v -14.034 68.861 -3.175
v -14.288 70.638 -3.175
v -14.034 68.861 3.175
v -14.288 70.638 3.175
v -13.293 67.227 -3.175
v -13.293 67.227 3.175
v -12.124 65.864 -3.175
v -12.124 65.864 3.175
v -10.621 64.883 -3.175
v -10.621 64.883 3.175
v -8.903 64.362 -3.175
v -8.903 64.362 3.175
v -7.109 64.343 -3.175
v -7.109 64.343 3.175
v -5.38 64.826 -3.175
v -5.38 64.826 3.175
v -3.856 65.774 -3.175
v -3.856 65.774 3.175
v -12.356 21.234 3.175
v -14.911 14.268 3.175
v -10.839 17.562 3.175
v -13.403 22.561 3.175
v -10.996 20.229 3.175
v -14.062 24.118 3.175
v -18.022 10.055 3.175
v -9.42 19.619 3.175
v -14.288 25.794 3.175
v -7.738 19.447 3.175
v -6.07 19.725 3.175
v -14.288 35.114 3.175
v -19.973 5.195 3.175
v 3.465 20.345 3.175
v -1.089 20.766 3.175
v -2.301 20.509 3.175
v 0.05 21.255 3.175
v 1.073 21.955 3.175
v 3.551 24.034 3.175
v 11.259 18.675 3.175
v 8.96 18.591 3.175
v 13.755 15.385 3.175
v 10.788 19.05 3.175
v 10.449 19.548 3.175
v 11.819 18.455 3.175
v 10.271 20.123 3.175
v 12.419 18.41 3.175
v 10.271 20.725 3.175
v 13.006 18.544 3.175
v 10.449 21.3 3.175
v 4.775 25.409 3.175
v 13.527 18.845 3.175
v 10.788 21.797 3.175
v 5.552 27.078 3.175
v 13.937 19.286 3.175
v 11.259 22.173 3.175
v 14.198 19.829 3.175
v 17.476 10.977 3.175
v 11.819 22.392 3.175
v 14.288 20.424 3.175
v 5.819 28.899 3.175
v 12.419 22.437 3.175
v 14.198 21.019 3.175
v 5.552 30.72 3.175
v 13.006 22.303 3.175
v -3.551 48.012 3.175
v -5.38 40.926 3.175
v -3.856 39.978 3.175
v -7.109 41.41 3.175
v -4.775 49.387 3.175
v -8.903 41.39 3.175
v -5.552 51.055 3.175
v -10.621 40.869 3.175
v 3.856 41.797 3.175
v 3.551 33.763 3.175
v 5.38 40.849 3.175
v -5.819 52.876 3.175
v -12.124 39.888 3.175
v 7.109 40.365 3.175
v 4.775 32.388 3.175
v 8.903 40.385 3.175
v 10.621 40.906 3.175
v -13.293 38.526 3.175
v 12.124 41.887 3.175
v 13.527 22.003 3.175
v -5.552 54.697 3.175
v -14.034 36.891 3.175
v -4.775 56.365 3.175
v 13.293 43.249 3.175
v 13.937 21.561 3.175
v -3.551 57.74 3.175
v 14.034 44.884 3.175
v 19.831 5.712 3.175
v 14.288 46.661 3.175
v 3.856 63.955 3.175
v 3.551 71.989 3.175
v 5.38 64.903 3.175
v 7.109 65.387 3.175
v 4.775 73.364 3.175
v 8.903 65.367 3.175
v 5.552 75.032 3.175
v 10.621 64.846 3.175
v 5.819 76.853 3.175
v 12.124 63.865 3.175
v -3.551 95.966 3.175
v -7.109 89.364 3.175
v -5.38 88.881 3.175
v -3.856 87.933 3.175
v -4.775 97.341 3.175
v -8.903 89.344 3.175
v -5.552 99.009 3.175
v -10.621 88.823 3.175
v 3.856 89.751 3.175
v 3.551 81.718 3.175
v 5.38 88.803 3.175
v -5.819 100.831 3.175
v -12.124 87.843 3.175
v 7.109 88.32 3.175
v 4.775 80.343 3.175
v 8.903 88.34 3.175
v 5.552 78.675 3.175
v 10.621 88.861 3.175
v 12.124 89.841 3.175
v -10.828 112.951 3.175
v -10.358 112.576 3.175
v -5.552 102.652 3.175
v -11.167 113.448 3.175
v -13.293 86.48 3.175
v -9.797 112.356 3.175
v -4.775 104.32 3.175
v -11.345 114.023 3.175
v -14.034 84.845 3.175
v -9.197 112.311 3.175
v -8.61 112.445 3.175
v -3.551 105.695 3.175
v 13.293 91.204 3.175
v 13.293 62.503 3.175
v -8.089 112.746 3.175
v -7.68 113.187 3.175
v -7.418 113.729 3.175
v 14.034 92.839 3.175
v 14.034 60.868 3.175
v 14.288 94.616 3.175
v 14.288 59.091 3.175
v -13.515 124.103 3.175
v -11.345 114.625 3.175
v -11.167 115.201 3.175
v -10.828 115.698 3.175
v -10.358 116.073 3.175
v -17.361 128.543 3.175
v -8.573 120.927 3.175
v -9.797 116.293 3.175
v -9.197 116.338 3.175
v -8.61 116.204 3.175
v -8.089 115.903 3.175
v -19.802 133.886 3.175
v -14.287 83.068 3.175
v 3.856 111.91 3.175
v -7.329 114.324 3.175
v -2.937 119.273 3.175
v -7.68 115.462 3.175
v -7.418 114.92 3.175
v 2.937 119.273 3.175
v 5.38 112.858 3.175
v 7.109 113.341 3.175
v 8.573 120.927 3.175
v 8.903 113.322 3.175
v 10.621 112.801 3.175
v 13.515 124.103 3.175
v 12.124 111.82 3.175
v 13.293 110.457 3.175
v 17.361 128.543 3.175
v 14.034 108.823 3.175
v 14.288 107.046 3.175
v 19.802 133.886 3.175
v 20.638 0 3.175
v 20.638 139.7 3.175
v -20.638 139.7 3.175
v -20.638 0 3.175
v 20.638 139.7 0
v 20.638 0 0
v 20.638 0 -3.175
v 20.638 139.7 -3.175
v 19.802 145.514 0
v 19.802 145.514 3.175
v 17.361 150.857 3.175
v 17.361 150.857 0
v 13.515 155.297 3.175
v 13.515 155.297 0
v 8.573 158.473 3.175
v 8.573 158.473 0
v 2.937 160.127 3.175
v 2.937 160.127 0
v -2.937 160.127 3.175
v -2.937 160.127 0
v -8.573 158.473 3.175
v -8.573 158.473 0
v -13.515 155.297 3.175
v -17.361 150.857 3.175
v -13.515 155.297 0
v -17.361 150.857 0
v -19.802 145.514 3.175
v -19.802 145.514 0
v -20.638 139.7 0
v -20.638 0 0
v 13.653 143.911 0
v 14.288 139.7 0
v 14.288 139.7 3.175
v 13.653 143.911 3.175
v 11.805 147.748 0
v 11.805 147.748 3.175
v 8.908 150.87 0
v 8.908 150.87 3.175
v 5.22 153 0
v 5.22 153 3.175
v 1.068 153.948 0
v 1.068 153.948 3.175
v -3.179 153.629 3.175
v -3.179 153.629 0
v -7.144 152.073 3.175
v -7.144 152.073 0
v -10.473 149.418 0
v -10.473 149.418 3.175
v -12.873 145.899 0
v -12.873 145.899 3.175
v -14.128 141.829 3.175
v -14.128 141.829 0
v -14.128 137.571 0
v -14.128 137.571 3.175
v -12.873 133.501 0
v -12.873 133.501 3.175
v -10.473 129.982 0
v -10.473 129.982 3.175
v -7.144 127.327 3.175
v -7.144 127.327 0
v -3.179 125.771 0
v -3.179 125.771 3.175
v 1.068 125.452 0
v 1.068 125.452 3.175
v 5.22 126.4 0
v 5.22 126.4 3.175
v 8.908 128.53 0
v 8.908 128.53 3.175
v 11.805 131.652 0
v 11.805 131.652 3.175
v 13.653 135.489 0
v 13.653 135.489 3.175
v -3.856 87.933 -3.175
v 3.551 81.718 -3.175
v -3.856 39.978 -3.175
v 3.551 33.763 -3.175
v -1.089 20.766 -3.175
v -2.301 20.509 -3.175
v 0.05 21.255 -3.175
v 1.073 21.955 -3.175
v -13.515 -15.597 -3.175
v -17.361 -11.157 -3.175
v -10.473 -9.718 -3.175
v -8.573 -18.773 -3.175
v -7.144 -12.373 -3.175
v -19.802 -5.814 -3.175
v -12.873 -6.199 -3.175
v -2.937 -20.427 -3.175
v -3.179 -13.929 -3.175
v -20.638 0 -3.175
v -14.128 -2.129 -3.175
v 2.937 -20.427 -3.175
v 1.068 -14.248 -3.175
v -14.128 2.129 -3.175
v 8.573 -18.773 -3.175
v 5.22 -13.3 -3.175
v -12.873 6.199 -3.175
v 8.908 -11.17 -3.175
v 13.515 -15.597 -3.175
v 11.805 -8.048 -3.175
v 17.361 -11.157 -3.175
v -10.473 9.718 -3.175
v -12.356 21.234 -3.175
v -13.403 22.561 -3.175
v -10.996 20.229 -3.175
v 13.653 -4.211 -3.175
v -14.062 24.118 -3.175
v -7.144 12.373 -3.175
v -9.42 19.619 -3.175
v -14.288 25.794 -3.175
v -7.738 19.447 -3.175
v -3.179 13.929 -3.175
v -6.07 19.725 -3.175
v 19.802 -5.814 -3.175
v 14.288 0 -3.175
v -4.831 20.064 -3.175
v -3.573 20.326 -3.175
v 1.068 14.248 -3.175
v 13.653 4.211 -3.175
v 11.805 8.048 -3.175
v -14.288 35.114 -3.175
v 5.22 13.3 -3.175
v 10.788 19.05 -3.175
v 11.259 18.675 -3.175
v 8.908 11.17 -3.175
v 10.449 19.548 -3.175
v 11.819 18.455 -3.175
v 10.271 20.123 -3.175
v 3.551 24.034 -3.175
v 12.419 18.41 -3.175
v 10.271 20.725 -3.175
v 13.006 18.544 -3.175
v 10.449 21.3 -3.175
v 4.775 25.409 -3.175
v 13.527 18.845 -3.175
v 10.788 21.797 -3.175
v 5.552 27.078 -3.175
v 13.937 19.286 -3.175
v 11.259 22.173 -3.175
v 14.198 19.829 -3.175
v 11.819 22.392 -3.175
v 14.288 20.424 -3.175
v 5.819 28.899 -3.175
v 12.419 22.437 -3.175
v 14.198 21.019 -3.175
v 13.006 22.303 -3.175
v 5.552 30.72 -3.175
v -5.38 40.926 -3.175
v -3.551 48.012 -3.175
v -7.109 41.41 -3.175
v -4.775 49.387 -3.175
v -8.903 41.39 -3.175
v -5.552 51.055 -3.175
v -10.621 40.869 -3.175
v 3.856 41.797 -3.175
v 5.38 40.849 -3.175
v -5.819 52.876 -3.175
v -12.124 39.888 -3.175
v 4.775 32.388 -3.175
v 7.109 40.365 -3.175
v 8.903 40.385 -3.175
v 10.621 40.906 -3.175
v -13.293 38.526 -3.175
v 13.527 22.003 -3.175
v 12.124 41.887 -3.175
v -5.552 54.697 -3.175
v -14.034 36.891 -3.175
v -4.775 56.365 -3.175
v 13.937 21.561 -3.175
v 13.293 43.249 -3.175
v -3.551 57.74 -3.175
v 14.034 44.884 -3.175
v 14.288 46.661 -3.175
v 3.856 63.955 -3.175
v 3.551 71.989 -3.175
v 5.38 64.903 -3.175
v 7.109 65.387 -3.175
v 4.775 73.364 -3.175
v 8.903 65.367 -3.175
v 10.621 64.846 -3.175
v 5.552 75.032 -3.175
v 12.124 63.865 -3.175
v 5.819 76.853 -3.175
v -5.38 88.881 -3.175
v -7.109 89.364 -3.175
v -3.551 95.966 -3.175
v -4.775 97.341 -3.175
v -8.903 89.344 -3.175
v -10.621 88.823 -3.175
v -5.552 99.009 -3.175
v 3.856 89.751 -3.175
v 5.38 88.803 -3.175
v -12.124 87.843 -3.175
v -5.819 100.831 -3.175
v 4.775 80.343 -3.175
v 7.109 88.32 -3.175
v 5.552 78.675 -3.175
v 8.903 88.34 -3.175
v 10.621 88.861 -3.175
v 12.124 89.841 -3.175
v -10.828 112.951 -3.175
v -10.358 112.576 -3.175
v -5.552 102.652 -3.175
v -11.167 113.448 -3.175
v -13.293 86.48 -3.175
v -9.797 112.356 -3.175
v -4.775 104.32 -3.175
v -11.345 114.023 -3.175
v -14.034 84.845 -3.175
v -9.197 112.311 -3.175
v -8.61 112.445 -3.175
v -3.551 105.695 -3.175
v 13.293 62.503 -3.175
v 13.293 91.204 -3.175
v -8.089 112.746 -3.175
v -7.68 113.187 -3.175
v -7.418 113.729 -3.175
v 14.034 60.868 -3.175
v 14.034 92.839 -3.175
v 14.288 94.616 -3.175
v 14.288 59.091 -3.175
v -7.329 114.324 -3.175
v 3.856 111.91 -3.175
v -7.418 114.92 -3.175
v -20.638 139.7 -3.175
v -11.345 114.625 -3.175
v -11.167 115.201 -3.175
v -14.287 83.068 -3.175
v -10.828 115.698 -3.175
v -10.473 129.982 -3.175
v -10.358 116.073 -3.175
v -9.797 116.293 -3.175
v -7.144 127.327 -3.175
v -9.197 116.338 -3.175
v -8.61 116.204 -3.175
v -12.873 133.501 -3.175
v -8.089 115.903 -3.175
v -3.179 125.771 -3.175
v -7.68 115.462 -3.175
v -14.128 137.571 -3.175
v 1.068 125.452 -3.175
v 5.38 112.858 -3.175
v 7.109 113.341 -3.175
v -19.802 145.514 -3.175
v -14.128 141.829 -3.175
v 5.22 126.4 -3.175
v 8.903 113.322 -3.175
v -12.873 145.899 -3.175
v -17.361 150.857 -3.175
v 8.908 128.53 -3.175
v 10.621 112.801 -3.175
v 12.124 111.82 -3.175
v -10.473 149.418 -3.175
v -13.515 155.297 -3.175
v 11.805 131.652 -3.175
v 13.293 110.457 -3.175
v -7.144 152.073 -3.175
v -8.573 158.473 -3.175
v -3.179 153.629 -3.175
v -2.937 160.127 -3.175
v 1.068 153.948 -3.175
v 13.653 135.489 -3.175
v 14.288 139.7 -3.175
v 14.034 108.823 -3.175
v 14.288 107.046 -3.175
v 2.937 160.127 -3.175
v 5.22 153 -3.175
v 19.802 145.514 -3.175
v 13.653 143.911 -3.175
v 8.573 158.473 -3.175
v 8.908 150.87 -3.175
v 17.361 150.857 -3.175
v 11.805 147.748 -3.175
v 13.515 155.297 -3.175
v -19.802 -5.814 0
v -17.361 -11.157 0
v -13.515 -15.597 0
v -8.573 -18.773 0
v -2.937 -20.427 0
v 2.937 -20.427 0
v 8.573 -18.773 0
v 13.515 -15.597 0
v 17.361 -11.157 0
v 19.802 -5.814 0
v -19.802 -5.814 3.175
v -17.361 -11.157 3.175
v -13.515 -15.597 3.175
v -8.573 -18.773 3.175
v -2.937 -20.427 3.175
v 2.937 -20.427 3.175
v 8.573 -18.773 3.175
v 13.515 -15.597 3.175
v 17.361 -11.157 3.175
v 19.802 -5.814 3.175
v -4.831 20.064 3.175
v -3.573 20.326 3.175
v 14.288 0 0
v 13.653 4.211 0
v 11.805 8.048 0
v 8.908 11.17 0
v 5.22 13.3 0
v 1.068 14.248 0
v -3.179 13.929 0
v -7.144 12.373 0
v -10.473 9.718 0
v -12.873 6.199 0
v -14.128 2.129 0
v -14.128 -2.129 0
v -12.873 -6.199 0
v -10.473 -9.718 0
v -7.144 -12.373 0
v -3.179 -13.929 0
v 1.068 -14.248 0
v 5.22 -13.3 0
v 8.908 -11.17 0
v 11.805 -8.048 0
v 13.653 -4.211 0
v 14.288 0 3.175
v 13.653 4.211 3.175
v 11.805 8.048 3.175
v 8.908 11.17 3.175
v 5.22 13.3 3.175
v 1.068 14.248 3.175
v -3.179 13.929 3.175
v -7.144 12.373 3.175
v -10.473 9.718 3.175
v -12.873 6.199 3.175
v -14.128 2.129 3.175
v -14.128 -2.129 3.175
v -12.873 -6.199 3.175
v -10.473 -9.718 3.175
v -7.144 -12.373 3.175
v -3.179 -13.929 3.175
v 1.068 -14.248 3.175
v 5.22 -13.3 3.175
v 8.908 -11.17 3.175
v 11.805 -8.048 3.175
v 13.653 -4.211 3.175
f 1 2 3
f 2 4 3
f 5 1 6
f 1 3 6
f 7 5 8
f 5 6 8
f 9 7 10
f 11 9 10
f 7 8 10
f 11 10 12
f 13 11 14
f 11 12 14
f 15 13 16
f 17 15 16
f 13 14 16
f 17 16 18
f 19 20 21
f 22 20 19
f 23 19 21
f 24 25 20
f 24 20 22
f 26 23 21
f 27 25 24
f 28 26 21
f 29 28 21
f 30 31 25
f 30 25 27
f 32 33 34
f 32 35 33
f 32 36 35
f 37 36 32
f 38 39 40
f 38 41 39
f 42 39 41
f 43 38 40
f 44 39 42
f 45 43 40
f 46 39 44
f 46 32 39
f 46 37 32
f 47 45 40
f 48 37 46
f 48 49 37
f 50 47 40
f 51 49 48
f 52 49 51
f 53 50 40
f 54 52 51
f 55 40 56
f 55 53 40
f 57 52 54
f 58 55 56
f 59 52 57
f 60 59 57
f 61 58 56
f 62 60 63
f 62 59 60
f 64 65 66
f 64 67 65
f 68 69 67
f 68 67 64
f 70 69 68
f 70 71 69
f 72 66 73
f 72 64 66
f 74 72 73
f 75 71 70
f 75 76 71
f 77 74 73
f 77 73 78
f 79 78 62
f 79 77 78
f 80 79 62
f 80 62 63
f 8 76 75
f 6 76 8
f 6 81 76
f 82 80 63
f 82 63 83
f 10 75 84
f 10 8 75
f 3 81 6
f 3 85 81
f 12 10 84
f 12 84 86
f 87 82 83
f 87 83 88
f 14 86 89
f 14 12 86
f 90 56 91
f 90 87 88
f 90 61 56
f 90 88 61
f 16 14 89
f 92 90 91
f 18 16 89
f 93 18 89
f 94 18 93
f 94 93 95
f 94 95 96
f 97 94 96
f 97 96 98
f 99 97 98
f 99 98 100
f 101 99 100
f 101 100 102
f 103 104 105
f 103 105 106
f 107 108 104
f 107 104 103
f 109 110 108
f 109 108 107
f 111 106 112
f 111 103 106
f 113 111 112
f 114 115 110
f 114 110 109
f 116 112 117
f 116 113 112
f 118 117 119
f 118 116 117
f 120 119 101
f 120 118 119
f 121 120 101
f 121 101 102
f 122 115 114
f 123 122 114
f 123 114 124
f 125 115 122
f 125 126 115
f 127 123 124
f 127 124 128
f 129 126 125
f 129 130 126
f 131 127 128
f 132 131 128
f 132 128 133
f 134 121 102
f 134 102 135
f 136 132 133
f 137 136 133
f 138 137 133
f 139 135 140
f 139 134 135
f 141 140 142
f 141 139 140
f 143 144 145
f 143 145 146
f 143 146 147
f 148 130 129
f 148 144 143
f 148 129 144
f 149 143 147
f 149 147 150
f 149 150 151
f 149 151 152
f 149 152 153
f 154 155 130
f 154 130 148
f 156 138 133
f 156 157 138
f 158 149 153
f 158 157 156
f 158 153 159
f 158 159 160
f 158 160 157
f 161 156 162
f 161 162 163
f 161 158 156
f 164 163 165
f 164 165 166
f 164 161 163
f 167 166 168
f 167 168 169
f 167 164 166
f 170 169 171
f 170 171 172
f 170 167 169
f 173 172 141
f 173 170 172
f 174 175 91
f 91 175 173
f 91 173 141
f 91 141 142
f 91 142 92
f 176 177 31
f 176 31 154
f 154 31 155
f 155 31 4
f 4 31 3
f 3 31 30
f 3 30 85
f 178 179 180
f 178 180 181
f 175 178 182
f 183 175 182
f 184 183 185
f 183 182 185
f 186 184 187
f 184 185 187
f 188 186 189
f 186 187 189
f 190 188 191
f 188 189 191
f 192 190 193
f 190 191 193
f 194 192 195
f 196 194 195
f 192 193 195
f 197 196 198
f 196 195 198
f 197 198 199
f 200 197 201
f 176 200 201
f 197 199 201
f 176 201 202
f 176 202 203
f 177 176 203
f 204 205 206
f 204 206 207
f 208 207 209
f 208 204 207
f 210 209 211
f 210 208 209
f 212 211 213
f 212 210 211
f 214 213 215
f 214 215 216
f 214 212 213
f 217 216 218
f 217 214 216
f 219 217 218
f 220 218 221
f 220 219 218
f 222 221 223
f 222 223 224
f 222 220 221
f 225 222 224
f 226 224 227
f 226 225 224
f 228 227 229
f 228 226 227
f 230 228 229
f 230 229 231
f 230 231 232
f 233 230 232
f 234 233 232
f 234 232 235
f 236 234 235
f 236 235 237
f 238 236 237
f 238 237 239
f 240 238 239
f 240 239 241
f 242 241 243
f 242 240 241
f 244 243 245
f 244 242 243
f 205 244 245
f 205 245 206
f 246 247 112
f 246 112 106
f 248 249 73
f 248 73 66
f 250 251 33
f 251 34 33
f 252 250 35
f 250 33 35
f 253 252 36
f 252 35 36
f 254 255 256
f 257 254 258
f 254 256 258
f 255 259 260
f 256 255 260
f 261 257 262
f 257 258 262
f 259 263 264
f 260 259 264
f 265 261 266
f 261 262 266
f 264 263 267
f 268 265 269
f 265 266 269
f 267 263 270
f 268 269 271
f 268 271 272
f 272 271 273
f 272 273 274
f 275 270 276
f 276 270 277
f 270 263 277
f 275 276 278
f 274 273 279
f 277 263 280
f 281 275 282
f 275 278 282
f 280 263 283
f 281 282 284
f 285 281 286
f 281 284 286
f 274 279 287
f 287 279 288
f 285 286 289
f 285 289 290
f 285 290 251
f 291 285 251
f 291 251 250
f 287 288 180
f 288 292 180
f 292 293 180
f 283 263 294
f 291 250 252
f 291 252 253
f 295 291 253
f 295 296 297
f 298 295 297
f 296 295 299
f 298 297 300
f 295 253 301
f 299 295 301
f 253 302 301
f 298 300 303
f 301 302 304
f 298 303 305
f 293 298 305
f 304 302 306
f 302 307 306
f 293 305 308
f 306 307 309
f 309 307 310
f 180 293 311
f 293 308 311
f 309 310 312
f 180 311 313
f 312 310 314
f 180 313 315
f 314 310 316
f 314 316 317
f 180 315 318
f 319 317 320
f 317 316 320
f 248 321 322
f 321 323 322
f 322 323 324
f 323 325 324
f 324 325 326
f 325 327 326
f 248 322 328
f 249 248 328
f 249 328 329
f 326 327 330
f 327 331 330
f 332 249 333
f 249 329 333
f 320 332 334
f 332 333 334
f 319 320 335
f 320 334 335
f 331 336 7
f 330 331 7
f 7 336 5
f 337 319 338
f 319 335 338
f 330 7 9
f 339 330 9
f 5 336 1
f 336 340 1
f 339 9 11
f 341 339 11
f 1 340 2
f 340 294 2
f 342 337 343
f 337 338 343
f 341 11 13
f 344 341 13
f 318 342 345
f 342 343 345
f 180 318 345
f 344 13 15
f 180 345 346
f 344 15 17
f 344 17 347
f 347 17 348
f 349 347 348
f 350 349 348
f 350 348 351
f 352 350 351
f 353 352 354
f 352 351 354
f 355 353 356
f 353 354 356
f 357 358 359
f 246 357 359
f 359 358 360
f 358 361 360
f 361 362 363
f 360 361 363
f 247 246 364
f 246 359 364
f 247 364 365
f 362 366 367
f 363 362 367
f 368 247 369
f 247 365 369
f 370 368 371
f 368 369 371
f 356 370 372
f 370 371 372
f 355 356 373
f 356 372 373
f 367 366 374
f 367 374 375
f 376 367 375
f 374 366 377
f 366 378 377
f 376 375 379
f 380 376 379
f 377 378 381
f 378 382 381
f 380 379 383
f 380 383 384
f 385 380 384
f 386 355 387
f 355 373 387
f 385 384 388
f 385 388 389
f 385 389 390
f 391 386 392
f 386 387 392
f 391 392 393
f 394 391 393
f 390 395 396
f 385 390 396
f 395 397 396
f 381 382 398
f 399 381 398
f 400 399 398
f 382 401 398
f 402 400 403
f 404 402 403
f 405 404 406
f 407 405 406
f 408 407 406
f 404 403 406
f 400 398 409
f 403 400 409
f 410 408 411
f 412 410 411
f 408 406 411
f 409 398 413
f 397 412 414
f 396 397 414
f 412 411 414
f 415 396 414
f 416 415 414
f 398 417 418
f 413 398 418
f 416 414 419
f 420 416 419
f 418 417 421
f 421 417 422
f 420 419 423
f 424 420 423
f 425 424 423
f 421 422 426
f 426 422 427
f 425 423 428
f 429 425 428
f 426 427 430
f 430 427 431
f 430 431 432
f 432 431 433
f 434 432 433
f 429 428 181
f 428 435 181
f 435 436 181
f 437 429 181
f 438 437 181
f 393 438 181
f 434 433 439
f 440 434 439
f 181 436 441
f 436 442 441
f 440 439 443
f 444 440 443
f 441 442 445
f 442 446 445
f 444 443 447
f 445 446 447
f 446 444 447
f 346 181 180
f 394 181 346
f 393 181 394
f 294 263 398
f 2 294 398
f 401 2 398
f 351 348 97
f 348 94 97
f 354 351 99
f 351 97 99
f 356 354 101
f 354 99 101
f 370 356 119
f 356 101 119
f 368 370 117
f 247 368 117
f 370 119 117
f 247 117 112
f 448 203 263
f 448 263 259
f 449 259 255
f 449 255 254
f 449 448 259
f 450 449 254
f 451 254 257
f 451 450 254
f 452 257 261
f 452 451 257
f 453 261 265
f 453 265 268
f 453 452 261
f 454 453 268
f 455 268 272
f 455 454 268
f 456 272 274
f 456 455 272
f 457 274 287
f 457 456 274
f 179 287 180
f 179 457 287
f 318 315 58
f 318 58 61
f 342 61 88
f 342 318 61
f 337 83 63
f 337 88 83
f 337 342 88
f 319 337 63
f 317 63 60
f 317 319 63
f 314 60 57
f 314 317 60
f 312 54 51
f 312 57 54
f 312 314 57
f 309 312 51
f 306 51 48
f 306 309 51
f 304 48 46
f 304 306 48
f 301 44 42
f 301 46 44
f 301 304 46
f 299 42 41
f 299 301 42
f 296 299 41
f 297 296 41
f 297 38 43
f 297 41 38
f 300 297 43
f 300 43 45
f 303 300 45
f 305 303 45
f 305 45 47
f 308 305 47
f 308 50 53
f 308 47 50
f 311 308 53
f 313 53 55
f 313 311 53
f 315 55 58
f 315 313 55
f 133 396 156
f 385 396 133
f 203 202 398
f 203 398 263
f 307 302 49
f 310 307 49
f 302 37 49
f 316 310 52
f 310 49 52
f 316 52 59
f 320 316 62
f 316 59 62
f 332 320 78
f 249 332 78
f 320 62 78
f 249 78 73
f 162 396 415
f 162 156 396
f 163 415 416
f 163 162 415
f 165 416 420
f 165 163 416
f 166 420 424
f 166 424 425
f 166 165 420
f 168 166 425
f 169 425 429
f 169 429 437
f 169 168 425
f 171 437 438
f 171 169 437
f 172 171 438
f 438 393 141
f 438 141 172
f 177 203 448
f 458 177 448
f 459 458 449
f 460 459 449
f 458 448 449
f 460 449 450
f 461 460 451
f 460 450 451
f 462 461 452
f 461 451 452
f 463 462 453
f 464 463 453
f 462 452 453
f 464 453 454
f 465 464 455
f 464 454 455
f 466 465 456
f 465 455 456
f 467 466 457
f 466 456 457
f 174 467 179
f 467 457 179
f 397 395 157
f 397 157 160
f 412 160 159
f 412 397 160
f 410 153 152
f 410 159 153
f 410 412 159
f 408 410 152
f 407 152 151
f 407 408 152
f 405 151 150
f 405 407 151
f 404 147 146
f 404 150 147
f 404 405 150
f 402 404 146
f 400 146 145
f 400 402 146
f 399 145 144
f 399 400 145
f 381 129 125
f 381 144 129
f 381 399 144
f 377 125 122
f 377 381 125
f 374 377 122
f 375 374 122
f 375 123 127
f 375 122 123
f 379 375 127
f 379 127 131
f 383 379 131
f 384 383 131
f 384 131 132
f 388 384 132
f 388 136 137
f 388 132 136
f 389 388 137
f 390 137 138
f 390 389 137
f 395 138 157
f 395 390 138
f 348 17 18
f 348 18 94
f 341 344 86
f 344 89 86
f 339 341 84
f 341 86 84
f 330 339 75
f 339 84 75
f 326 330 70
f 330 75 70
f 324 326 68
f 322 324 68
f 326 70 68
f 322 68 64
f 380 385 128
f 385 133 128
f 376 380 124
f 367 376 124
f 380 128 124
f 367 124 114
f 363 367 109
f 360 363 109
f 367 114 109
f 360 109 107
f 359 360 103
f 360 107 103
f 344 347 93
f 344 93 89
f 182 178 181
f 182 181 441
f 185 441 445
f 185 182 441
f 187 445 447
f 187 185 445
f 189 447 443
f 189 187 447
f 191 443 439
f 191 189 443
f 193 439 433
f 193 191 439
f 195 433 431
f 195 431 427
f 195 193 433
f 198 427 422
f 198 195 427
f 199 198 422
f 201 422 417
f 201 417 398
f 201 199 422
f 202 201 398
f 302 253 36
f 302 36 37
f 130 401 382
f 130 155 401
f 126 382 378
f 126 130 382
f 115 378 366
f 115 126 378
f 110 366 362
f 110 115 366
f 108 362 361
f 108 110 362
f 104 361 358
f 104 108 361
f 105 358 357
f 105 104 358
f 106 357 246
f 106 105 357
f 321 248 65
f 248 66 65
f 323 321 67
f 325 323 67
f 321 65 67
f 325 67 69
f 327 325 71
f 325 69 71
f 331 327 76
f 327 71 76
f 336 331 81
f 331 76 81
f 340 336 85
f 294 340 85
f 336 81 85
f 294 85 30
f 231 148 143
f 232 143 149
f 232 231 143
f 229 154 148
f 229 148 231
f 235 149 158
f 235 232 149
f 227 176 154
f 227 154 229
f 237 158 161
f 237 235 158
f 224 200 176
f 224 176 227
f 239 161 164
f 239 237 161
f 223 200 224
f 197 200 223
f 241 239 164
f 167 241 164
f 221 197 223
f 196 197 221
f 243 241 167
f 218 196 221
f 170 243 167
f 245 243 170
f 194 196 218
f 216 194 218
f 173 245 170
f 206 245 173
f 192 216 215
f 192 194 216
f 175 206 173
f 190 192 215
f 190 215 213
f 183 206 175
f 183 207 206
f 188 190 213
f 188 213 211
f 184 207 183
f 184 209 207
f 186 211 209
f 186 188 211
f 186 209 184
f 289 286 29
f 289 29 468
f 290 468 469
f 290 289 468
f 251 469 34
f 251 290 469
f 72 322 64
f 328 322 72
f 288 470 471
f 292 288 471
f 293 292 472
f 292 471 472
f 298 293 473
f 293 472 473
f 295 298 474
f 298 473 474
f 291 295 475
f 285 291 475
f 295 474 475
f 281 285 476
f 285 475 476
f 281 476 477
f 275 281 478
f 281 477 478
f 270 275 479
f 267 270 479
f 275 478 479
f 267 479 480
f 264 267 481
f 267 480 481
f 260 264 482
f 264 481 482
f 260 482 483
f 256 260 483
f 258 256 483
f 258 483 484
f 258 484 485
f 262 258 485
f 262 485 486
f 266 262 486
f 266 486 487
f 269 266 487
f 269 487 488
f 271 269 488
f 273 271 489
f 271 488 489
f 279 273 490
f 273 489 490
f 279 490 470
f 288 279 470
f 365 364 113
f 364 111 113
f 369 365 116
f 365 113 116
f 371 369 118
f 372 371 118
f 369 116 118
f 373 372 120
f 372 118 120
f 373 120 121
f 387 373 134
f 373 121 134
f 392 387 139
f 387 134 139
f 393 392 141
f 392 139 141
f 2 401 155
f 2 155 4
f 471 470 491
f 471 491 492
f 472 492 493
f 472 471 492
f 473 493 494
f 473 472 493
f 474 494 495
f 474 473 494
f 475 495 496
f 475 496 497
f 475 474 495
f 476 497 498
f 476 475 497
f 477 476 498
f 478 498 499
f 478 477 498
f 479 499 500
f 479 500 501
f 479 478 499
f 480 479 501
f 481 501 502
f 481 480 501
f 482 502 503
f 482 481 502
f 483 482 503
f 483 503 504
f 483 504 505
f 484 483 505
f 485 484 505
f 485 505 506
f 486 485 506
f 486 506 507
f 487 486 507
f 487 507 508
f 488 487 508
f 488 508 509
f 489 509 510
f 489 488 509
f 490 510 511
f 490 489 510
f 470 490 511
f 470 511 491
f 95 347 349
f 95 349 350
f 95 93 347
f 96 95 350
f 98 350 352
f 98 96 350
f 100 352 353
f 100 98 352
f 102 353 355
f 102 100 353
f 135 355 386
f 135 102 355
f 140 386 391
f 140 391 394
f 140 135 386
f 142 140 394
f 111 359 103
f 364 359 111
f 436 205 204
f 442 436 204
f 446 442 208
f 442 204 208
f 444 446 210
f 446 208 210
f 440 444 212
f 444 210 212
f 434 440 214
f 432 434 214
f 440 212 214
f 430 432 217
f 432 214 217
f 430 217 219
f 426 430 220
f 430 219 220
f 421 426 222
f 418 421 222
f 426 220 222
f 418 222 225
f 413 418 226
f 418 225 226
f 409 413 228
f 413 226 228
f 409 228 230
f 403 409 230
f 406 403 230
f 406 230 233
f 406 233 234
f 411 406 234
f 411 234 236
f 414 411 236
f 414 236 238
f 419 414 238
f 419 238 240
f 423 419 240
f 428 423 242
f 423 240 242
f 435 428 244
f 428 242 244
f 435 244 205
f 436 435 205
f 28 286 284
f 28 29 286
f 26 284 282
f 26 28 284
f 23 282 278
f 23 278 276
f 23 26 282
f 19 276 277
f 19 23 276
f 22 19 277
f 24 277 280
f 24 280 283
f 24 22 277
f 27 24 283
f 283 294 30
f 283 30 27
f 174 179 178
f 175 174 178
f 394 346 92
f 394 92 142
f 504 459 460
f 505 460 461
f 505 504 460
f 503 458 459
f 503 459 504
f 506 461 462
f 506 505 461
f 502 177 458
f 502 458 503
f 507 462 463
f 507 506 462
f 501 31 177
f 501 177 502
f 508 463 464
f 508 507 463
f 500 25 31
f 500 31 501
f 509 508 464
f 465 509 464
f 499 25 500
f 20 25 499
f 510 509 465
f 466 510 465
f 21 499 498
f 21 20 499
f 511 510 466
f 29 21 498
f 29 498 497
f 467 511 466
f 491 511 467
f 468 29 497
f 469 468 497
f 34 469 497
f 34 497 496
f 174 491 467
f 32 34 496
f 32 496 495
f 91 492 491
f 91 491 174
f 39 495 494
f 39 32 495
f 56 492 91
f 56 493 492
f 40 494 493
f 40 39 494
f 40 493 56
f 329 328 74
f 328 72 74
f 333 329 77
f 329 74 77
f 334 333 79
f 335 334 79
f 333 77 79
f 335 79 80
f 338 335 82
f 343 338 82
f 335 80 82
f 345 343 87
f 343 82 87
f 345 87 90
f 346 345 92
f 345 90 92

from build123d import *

# Parameters (mm, degrees)
SKETCH2_R               = 20.6375
SKETCH2_R_2             = 14.2875
BOSS_EXTRUDE1_DEPTH     = 3.175
CUT_EXTRUDE1_DEPTH      = 162.691375582
CUT_EXTRUDE1_DEPTH_BACK = 162.691375582
SKETCH3_R               = 2.0193
FILLET2_R               = 6.35


with BuildPart() as part:
    # Sketch2 → Boss-Extrude1 (new, symmetric)
    # profile 1 of 3: a face of its own
    with BuildSketch(Plane.XY):
        with BuildLine():
            Line((20.6375, 0), (20.6375, 139.7))
            ThreePointArc((20.6375, 139.7), (0, 119.0625), (-20.6375, 139.7))
            Line((-20.6375, 139.7), (-20.6375, 0))
            ThreePointArc((-20.6375, 0), (0, 20.6375), (20.6375, 0))
        make_face()
    # profile 2 of 3: a face of its own
    with BuildSketch(Plane.XY):
        with Locations((0, 139.7)):
            Circle(SKETCH2_R)
        with Locations((0, 139.7)):
            Circle(SKETCH2_R_2, mode=Mode.SUBTRACT)
    # profile 3 of 3: a face of its own
    with BuildSketch(Plane.XY):
        Circle(SKETCH2_R)
        Circle(SKETCH2_R_2, mode=Mode.SUBTRACT)
    extrude(amount=BOSS_EXTRUDE1_DEPTH, both=True)

    # Sketch3 → Cut-Extrude1 (cut, two sides: drawn at the far end of the back side and taken through both)
    with BuildSketch(Plane.XY.offset(-CUT_EXTRUDE1_DEPTH_BACK)):
        Polygon((14.2875, 80.998054184), (14.2875, 120.663261819), (-9.34807685, 100.830658002), align=None)
        Polygon((9.34807685, 76.853386041), (-14.2875, 96.685989858), (-14.2875, 57.020782224), align=None)
        Polygon((14.2875, 33.043510263), (14.2875, 72.708717897), (-9.34807685, 52.87611408), align=None)
        with BuildLine():
            Line((9.34807685, 28.898842119), (-14.2875, 48.731445936))
            Line((-14.2875, 48.731445936), (-14.2875, 14.892070037))
            ThreePointArc((-14.2875, 14.892070037), (-7.933318425, 19.051741785), (-0.504765013, 20.631326146))
            Line((-0.504765013, 20.631326146), (9.34807685, 28.898842119))
        make_face()
        with Locations((-9.34807685, 114.324408002)):
            Circle(SKETCH3_R)
        with Locations((12.2682, 20.423771151)):
            Circle(SKETCH3_R)
    extrude(amount=CUT_EXTRUDE1_DEPTH + CUT_EXTRUDE1_DEPTH_BACK, mode=Mode.SUBTRACT)

    # Fillet2
    fillet2_edges = [part.edges().sort_by_distance(p)[0] for p in [
        (-0.504765013, 20.631326146, 0),
        (-14.2875, 14.892070037, 0),
        (-14.2875, 48.731445936, 0),
        (9.34807685, 28.898842119, 0),
        (9.34807685, 76.853386041, 0),
        (-14.2875, 57.020782224, 0),
        (-14.2875, 96.685989858, 0),
        (-9.34807685, 52.87611408, 0),
        (14.2875, 72.708717897, 0),
        (14.2875, 33.043510263, 0),
        (-9.34807685, 100.830658002, 0),
        (14.2875, 120.663261819, 0),
        (14.2875, 80.998054184, 0),
    ]]
    fillet(fillet2_edges, radius=FILLET2_R)


solid = part.part
